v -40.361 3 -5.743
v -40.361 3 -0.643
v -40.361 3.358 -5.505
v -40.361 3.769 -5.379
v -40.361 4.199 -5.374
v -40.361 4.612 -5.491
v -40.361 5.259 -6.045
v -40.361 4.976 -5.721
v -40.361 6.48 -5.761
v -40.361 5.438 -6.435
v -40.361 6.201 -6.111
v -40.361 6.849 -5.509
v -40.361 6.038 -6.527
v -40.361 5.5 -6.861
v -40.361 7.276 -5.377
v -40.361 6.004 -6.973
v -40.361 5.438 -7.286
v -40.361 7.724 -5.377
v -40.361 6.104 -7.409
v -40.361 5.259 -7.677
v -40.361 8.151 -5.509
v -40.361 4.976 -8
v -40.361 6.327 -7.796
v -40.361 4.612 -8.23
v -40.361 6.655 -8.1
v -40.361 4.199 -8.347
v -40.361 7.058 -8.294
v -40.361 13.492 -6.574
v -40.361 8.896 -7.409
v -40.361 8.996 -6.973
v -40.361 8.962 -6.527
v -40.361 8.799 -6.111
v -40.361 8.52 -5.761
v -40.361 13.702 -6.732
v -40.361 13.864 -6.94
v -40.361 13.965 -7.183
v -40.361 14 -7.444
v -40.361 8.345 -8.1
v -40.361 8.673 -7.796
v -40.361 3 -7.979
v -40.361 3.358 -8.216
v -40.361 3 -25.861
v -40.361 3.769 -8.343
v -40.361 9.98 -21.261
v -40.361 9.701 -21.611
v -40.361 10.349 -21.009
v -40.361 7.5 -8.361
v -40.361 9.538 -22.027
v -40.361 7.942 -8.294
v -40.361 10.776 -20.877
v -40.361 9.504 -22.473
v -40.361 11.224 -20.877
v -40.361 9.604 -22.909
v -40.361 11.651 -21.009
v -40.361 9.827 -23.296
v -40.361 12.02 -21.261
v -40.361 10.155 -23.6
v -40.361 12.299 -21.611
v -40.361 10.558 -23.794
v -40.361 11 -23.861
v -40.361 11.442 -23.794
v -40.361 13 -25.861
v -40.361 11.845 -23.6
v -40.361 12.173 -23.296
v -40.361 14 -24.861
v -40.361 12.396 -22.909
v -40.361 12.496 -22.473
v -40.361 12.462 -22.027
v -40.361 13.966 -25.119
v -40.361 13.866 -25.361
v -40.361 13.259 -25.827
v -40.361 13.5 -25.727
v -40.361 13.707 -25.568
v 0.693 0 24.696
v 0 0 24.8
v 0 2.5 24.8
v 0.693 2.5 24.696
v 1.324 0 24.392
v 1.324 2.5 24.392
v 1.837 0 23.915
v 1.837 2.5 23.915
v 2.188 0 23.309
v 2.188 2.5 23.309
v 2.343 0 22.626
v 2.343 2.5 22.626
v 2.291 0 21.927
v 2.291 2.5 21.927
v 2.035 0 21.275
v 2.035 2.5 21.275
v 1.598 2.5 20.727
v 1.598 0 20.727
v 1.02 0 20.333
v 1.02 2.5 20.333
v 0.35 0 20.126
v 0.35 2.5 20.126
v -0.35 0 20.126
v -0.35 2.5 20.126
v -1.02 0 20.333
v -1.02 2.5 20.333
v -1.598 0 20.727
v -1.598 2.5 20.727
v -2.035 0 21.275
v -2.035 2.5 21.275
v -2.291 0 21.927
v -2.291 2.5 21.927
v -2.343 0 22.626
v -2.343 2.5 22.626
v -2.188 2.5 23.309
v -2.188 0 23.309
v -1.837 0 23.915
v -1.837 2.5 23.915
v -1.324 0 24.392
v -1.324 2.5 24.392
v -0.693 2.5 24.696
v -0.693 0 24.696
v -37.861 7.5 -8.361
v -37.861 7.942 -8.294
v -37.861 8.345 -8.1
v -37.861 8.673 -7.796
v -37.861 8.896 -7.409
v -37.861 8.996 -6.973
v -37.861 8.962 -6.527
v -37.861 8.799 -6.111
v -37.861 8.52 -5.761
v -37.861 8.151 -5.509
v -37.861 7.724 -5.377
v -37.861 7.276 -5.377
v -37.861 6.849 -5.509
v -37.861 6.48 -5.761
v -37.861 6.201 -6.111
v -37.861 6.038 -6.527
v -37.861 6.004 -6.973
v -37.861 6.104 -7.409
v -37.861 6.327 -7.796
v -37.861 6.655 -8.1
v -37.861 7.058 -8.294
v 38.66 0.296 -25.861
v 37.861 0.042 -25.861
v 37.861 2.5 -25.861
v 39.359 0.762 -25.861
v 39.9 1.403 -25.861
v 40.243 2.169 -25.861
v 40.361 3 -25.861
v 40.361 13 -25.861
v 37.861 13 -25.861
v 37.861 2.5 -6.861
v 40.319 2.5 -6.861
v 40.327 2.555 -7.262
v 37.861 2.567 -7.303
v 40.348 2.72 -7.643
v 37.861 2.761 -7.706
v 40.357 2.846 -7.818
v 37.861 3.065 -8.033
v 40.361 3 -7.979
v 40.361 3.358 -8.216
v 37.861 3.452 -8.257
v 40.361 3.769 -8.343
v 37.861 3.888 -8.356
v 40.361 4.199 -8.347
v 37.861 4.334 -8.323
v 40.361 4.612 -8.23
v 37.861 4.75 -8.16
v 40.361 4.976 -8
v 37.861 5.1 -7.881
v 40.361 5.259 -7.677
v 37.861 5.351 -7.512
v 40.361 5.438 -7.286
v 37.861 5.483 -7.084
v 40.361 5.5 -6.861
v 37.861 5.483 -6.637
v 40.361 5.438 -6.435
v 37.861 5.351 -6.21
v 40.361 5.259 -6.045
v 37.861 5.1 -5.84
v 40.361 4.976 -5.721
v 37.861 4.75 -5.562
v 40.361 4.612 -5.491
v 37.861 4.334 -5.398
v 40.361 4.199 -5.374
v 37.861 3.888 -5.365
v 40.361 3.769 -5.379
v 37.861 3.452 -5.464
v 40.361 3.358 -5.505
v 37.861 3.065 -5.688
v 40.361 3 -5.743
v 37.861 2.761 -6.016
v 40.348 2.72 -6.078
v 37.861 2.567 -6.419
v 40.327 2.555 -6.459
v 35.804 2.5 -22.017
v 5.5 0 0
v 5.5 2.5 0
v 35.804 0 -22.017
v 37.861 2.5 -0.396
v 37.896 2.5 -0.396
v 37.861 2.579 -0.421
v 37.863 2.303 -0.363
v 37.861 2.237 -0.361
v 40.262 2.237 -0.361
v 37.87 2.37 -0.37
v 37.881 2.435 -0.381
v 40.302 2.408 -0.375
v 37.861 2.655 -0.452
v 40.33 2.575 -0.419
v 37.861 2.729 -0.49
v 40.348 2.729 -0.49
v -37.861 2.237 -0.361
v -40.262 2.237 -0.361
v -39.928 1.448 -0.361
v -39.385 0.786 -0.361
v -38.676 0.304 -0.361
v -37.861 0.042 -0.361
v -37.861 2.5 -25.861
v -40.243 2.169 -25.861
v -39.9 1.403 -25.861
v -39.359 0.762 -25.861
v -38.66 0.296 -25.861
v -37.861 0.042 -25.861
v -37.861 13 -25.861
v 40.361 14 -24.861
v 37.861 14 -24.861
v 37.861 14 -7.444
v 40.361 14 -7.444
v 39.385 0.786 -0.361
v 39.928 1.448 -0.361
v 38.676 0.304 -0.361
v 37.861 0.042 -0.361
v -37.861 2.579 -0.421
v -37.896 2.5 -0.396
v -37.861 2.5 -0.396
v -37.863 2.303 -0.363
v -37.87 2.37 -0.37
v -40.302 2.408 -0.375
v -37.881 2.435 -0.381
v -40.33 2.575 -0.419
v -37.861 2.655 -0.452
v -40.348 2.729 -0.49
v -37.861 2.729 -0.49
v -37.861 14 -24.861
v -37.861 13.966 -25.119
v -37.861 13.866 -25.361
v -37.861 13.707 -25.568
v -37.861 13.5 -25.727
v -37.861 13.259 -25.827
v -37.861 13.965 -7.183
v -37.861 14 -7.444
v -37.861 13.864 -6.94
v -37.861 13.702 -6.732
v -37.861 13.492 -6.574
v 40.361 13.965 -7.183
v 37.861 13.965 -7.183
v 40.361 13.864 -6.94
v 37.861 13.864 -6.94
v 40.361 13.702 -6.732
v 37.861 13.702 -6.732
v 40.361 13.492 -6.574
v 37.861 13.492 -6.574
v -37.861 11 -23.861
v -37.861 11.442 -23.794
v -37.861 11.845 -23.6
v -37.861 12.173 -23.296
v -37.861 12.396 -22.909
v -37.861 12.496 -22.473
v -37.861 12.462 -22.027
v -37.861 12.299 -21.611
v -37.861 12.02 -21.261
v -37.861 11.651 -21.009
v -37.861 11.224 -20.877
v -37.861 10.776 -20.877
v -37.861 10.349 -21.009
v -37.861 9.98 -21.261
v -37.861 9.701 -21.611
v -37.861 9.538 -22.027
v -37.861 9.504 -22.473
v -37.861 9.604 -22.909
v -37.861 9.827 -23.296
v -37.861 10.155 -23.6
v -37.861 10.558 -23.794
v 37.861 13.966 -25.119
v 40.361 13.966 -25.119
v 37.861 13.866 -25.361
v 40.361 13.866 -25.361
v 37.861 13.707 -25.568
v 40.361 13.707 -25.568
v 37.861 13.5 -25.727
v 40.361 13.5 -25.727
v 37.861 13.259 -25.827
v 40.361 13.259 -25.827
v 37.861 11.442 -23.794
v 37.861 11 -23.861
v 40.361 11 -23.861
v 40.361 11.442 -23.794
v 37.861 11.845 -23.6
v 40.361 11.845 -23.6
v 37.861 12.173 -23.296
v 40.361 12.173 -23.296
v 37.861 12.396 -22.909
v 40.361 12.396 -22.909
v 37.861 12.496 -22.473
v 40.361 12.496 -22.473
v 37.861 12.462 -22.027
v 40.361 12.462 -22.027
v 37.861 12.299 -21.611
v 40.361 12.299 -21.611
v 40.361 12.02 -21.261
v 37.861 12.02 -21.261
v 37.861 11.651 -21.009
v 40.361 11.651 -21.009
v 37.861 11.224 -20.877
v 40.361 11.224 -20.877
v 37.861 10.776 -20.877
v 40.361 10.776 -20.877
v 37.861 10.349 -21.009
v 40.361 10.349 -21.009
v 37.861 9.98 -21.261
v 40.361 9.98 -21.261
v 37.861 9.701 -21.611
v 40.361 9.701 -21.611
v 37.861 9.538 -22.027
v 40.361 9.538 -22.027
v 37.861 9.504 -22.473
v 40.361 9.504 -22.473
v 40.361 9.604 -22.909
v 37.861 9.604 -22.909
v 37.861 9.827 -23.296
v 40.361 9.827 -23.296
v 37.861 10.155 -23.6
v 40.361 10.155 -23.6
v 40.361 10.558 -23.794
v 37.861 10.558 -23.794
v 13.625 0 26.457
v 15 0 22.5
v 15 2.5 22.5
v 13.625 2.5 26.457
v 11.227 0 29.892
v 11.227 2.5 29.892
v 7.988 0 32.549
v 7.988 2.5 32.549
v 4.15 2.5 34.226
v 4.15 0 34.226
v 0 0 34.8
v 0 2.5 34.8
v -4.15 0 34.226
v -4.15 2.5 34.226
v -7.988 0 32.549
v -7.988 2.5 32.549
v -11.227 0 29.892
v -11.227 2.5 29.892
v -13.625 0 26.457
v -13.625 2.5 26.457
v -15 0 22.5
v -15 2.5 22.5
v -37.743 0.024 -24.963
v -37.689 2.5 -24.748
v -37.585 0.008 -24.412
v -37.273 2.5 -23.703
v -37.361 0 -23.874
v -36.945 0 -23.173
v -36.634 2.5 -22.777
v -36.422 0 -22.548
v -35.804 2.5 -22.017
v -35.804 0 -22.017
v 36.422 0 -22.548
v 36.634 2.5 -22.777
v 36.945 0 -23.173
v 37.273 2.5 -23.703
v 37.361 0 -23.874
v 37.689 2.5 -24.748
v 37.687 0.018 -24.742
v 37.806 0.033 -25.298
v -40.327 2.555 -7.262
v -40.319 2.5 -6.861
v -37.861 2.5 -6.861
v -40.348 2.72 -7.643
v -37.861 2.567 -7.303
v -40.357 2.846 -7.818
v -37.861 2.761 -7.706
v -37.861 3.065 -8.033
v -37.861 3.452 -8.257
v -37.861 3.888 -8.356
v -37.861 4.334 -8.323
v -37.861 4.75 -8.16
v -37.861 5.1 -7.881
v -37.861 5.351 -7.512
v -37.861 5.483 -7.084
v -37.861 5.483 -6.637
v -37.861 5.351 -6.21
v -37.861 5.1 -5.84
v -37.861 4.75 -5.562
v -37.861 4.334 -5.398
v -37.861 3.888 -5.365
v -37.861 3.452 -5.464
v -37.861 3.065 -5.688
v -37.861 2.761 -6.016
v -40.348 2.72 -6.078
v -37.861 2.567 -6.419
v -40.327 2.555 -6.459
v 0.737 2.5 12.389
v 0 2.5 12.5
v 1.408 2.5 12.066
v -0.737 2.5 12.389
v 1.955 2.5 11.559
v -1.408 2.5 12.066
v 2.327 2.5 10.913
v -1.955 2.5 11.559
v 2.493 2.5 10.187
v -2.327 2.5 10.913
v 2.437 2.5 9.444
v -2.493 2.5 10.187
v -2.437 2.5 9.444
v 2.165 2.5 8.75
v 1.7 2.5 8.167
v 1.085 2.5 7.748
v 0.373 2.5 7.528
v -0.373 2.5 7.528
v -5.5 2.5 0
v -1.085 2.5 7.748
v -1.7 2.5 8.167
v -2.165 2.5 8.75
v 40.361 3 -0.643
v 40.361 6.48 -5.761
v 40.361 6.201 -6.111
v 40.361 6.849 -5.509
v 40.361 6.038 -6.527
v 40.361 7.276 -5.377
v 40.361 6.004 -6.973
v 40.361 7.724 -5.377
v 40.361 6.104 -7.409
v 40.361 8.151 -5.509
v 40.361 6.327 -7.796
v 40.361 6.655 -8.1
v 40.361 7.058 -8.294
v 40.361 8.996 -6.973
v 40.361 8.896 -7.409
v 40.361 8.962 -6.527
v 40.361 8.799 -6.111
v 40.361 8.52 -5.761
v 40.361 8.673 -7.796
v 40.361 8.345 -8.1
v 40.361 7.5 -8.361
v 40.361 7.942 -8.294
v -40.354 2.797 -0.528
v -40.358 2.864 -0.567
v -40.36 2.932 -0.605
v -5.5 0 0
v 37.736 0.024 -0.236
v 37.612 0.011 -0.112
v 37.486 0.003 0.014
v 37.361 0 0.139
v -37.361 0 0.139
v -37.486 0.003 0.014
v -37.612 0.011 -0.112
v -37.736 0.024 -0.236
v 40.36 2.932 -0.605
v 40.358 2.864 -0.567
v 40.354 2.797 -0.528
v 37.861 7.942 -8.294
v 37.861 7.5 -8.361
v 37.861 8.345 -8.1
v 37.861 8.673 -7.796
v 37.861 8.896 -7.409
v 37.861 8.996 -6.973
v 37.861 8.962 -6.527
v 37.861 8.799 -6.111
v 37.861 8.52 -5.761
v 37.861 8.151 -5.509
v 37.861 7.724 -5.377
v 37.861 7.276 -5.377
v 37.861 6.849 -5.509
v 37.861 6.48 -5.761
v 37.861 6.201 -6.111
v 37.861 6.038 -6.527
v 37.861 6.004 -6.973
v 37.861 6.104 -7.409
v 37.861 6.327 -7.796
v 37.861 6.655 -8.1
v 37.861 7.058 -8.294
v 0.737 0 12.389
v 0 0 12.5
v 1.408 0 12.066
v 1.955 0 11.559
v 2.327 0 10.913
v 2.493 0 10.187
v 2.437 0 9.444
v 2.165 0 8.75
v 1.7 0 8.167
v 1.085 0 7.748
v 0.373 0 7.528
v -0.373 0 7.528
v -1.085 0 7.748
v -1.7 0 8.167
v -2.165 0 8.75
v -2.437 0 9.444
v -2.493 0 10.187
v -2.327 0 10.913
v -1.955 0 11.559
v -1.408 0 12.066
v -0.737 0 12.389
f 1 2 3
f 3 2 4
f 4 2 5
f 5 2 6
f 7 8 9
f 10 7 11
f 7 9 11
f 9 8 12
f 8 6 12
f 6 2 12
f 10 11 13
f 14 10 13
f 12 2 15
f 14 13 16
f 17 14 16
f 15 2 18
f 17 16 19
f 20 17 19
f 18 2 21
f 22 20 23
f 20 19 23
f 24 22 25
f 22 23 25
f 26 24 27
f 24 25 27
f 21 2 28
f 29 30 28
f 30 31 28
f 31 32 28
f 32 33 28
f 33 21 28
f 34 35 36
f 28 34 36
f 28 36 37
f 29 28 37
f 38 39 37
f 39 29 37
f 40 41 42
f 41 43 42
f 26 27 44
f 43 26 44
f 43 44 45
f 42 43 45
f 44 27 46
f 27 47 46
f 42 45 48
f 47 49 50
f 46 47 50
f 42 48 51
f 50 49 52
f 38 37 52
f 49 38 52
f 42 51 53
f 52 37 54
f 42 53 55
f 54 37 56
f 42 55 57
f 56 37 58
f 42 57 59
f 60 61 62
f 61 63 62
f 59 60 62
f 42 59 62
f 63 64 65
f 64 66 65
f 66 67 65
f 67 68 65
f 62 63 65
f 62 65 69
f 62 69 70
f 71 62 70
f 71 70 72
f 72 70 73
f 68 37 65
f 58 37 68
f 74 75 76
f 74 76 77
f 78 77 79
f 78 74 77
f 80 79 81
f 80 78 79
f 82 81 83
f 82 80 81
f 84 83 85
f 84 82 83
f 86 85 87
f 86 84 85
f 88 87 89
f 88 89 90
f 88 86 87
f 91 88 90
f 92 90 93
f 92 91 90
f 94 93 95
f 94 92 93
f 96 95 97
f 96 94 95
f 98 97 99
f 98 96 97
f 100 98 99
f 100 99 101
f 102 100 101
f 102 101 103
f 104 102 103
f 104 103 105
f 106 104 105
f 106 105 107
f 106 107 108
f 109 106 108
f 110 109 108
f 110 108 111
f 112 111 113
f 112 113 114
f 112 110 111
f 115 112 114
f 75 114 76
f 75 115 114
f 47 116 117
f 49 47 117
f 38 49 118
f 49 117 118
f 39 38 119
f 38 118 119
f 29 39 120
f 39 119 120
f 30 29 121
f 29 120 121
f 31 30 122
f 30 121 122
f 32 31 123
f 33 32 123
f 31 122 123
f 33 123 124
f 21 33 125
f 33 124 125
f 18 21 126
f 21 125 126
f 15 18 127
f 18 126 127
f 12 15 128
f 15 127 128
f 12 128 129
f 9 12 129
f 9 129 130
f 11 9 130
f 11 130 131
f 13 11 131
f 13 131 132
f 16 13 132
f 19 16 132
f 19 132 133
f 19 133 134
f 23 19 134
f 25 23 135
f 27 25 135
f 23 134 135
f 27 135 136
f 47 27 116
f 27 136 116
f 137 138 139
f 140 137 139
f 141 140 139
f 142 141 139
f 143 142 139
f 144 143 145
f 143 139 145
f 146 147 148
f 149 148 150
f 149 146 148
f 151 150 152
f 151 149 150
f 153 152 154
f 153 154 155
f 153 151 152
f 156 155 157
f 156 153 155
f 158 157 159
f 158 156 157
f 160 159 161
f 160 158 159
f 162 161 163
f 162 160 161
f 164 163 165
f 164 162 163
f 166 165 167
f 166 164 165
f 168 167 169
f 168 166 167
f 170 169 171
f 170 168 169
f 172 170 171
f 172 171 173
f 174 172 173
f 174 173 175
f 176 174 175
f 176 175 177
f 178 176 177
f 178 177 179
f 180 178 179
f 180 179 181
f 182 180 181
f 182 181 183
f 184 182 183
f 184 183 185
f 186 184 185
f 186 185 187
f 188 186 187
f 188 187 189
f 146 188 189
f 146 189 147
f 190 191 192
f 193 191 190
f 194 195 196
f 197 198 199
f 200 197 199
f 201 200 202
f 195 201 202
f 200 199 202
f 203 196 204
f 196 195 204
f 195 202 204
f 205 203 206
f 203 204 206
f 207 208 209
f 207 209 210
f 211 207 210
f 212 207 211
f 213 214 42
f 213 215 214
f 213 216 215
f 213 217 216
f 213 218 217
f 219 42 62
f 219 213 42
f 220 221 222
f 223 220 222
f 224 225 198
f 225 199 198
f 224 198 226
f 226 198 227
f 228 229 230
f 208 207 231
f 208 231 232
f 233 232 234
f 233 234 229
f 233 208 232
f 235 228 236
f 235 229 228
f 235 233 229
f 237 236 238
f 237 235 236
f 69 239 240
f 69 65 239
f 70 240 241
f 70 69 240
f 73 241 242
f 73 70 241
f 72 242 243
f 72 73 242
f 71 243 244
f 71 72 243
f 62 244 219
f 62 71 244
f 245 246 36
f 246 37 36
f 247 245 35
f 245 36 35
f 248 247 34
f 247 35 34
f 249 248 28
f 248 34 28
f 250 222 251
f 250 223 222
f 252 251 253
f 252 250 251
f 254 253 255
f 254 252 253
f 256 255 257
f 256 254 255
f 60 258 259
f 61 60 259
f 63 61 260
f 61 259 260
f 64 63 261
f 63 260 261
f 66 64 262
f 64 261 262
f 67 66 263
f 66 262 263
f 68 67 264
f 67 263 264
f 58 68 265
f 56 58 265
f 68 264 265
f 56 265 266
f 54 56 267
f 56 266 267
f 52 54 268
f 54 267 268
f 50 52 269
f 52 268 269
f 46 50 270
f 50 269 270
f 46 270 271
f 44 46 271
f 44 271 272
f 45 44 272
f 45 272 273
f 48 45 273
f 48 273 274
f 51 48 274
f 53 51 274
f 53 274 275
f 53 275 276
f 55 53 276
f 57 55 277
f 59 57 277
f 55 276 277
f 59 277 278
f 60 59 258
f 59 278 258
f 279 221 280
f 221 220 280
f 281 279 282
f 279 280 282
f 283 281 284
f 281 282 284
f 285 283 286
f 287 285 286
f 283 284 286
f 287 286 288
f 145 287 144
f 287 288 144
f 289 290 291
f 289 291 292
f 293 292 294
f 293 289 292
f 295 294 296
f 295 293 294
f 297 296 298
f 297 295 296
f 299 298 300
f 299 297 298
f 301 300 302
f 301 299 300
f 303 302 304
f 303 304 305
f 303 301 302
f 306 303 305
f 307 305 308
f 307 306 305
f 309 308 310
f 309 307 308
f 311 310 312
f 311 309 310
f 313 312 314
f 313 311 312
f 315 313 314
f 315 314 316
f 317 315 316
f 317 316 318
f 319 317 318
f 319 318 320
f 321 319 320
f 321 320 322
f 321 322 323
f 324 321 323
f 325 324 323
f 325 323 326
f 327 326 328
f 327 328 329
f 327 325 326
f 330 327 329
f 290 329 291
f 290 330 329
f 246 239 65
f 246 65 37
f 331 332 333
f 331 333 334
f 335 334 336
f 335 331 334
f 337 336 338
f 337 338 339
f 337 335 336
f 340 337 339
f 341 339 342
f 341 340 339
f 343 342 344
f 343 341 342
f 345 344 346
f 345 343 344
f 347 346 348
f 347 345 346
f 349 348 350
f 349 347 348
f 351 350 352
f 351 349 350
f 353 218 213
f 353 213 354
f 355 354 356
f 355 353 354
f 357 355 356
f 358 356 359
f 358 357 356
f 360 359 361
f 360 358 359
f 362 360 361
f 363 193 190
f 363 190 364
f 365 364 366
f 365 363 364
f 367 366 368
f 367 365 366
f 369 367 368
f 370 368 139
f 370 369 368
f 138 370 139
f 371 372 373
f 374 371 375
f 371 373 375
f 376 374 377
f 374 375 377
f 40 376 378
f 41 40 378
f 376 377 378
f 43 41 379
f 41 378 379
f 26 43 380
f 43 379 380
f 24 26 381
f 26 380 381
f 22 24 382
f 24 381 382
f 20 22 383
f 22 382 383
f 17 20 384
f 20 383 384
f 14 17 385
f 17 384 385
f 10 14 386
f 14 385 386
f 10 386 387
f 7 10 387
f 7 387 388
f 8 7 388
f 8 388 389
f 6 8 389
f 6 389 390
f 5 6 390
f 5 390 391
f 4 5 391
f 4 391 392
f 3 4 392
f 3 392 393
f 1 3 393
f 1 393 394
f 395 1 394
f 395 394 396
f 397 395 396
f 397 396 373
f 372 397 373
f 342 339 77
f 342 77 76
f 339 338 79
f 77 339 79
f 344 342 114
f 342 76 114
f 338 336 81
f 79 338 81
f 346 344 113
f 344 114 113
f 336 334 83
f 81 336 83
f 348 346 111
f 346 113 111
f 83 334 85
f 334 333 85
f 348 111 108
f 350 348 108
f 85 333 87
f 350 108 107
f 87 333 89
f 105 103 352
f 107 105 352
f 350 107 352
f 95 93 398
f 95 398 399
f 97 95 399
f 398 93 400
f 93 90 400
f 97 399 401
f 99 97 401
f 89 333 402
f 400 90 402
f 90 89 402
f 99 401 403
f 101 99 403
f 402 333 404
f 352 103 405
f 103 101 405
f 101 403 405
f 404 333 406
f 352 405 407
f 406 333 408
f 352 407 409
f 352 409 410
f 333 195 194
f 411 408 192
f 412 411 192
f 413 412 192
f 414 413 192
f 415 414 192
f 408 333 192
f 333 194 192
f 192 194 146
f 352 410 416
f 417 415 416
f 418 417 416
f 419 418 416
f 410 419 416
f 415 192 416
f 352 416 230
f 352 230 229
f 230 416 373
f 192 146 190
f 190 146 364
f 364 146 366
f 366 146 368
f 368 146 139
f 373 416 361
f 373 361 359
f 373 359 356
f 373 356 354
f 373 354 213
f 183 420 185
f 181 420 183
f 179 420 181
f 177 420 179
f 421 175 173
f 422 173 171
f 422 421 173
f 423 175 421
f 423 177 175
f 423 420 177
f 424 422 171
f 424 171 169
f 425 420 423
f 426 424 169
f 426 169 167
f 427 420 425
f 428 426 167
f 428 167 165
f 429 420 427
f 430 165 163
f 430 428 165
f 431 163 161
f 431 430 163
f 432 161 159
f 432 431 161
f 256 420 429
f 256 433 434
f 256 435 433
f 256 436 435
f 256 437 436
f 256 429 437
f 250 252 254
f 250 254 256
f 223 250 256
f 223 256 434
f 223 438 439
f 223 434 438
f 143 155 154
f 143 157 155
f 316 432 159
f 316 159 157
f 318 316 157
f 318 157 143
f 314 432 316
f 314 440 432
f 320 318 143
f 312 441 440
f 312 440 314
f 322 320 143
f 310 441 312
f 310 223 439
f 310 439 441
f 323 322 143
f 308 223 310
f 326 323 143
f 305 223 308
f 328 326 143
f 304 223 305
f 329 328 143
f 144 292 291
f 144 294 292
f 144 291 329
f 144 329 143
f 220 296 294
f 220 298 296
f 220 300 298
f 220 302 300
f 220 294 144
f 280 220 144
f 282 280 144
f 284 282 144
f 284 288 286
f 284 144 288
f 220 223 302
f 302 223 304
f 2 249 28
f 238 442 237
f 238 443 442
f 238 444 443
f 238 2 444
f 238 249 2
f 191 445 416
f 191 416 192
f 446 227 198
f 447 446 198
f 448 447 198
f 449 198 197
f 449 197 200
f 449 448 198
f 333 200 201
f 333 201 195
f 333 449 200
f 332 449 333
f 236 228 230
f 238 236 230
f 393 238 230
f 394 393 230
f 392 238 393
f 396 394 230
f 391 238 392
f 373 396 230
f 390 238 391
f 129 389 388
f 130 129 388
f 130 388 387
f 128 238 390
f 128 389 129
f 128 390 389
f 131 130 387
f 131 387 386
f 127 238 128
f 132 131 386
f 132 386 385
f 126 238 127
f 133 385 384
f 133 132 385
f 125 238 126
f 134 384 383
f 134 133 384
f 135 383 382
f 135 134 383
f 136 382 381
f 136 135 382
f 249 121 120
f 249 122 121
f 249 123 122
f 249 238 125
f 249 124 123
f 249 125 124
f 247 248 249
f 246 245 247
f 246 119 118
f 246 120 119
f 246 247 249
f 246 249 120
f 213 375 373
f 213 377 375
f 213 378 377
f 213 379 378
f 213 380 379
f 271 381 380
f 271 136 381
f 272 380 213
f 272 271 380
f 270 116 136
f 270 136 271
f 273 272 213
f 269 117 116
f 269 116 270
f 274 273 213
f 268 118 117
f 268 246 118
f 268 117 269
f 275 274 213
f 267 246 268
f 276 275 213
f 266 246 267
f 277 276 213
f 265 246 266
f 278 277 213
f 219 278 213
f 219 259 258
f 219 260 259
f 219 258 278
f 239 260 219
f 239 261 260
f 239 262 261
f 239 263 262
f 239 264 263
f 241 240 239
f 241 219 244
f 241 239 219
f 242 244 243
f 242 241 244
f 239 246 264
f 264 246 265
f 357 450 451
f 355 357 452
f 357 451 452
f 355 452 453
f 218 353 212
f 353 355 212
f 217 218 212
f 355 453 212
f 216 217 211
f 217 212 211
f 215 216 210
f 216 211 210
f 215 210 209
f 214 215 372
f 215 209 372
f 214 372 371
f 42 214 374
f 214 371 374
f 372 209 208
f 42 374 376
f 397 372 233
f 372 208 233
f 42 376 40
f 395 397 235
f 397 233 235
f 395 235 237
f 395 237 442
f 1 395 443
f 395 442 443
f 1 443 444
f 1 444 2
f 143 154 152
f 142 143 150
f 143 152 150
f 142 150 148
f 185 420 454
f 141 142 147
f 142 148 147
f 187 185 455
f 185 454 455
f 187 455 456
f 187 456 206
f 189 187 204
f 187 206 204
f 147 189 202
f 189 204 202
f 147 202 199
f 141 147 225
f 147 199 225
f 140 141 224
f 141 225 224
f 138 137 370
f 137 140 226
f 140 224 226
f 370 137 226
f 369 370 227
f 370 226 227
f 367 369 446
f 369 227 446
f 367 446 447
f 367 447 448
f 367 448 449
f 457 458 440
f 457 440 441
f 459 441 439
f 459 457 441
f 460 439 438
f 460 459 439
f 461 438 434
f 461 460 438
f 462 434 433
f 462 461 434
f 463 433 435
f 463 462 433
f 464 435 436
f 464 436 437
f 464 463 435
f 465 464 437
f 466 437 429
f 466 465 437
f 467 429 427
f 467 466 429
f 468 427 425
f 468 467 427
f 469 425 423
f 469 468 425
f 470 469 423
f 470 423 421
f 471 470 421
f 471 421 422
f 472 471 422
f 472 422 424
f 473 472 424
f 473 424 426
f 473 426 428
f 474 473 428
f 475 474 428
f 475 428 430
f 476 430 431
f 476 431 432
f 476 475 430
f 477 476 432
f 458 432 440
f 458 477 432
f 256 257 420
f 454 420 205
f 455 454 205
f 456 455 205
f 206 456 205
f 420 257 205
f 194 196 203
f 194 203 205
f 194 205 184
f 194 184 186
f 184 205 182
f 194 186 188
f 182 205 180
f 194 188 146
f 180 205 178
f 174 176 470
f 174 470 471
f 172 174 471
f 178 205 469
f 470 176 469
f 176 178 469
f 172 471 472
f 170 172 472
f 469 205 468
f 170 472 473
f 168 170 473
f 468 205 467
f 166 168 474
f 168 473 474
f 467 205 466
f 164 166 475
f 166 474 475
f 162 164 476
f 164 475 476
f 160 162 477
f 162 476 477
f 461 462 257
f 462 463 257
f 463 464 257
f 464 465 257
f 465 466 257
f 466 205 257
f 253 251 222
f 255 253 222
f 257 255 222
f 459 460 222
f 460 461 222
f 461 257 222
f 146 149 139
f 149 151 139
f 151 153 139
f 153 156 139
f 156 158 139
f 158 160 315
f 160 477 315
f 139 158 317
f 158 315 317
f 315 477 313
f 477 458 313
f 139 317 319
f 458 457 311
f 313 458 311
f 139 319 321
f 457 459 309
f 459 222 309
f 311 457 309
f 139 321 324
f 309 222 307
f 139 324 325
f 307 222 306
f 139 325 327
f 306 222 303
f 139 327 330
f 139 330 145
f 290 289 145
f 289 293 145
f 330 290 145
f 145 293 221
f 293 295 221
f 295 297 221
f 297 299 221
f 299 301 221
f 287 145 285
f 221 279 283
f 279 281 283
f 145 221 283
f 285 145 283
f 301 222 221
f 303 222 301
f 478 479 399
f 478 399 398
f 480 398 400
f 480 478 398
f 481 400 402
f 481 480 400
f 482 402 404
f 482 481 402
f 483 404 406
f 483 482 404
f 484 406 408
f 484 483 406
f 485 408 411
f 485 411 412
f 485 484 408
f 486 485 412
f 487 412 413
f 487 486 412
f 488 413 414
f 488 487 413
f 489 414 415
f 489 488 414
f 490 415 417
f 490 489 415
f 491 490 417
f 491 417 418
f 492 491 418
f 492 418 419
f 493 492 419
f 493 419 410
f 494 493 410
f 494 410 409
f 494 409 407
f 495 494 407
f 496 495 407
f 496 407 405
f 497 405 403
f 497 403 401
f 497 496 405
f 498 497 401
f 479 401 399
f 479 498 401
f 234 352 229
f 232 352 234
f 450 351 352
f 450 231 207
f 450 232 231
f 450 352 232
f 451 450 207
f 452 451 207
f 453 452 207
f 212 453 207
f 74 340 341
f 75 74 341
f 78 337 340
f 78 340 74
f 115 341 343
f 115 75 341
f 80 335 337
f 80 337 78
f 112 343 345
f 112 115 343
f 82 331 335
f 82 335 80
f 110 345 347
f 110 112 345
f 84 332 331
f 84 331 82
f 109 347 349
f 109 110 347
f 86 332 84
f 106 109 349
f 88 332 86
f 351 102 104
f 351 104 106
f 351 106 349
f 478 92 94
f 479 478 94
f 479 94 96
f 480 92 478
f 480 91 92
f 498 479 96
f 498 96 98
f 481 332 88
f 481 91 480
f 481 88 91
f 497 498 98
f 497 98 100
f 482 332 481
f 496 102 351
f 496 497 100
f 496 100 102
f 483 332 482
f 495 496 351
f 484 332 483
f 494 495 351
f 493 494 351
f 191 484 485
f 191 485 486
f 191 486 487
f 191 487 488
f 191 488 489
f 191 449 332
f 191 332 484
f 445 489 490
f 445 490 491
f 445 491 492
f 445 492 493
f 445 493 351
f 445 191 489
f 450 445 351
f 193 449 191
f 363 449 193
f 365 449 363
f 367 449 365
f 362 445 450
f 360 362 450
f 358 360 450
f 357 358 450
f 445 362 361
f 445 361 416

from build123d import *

# Parameters (mm, degrees)
SKETCH1_R           = 2.35
SKETCH1_R_2         = 2.5
BOSS_EXTRUDE1_DEPTH = 2.5
SKETCH2_R           = 1.5
BOSS_EXTRUDE2_DEPTH = 2.5
FILLET1_R           = 5
FILLET2_R           = 1
FILLET3_R           = 3


with BuildPart() as part:
    # Sketch1 → Boss-Extrude1 (new body)
    with BuildSketch(Plane(origin=(0, 0, 0), x_dir=(1, 0, 0), z_dir=(0, 1, 0))):
        with BuildLine():
            Line((-5.5, 0), (5.5, 0))
            Line((5.5, 0), (37.860679775, 23.511410092))
            Line((37.860679775, 23.511410092), (37.860679775, 0.360679775))
            Line((37.860679775, 0.360679775), (15, -22.5))
            ThreePointArc((15, -22.5), (0, -34.8), (-15, -22.5))
            Line((-15, -22.5), (-37.860679775, 0.360679775))
            Line((-37.860679775, 0.360679775), (-37.860679775, 23.511410092))
            Line((-37.860679775, 23.511410092), (-5.5, 0))
        make_face()
        with Locations(Location((0, -22.45, 0), (0, 0, 270))):
            Circle(SKETCH1_R, mode=Mode.SUBTRACT)
        with Locations(Location((0, -10, 0), (0, 0, 270))):
            Circle(SKETCH1_R_2, mode=Mode.SUBTRACT)
    extrude(amount=BOSS_EXTRUDE1_DEPTH)

    # Sketch2 → Boss-Extrude2 (add)
    with BuildSketch(Plane(origin=(37.860679775, 0, 0), x_dir=(0, 0, -1), z_dir=(1, 0, 0))):
        Polygon((0.360679775, 0), (25.860679775, 0), (25.860679775, 14), (6.860679775, 14), (0.360679775, 2.5), align=None)
        with Locations((6.860679775, 7.5)):
            Circle(SKETCH2_R, mode=Mode.SUBTRACT)
        with Locations((22.360679775, 11)):
            Circle(SKETCH2_R, mode=Mode.SUBTRACT)
        with Locations(Location((6.860679775, 4, 0), (0, 0, 270))):
            Circle(SKETCH2_R, mode=Mode.SUBTRACT)
    boss_extrude2 = extrude(amount=BOSS_EXTRUDE2_DEPTH)

    # Mirror1: Boss-Extrude2 across plane
    add(boss_extrude2.mirror(Plane(origin=(0, 0, 0), x_dir=(0, 0, 1), z_dir=(1, 0, 0))))

    # Fillet1
    # the kernel refuses this fillet: 5 mm, written as the material it adds along each edge
    with BuildSketch(Plane(origin=(37.860679775, 0, -23.511410092), x_dir=(-0.8090169943749437, 0, 0.5877852522924782), z_dir=(0, 1, 0))) as fillet1_piece_1:
        with BuildLine():
            CenterArc((2.542616315, -5), FILLET1_R, 90, 51.692614863)
            Line((-1.380866074, -1.900599098), (-1.459335721, -1.83861108))
            ThreePointArc((-1.459335721, -1.83861108), (-0.771334736, -0.891521024), (-0.080901699, 0.058778525))
            Line((-0.080901699, 0.058778525), (0, 0.1))
            Line((0, 0.1), (2.542616315, 0.1))
            Line((2.542616315, 0.1), (2.542616315, 0))
        make_face()
    extrude(amount=2.5)
    with BuildSketch(Plane(origin=(-37.860679775, 0, -23.511410092), x_dir=(0.8090169943749425, 0, 0.58778525229248), z_dir=(0, 1, 0))) as fillet1_piece_2:
        with BuildLine():
            CenterArc((2.542616315, 5), FILLET1_R, 218.307385137, 51.692614863)
            Line((-1.380866074, 1.900599098), (-1.459335721, 1.83861108))
            ThreePointArc((-1.459335721, 1.83861108), (-0.771334736, 0.891521024), (-0.080901699, -0.058778525))
            Line((-0.080901699, -0.058778525), (0, -0.1))
            Line((0, -0.1), (2.542616315, -0.1))
            Line((2.542616315, -0.1), (2.542616315, 0))
        make_face()
    extrude(amount=2.5)

    # Fillet2
    fillet2_edges = [part.edges().sort_by_distance(p)[0] for p in [
        (39.110679775, 2.5, -0.360679775),
        (39.110679775, 14, -25.860679775),
        (39.110679775, 14, -6.860679775),
        (-39.110679775, 2.5, -0.360679775),
        (-39.110679775, 14, -6.860679775),
        (-39.110679775, 14, -25.860679775),
    ]]
    fillet(fillet2_edges, radius=FILLET2_R)

    # Fillet3
    # the kernel refuses this fillet: 3 mm, written as the material it takes off along each edge
    with BuildSketch(Plane(origin=(-40.360679775, 0, 7.139320225), x_dir=(1, 0, 0), z_dir=(0, 0, -1)), Plane(origin=(40.360679775, 0, 7.139320225), x_dir=(0, 1, 0), z_dir=(0, 0, -1))) as fillet3_piece_1:
        with BuildLine():
            CenterArc((FILLET3_R, -FILLET3_R), FILLET3_R, 90, 90)
            Line((0, -FILLET3_R), (0, 0))
            Line((0, 0), (FILLET3_R, 0))
        make_face()
    extrude(amount=40.5, mode=Mode.SUBTRACT)


solid = part.part
